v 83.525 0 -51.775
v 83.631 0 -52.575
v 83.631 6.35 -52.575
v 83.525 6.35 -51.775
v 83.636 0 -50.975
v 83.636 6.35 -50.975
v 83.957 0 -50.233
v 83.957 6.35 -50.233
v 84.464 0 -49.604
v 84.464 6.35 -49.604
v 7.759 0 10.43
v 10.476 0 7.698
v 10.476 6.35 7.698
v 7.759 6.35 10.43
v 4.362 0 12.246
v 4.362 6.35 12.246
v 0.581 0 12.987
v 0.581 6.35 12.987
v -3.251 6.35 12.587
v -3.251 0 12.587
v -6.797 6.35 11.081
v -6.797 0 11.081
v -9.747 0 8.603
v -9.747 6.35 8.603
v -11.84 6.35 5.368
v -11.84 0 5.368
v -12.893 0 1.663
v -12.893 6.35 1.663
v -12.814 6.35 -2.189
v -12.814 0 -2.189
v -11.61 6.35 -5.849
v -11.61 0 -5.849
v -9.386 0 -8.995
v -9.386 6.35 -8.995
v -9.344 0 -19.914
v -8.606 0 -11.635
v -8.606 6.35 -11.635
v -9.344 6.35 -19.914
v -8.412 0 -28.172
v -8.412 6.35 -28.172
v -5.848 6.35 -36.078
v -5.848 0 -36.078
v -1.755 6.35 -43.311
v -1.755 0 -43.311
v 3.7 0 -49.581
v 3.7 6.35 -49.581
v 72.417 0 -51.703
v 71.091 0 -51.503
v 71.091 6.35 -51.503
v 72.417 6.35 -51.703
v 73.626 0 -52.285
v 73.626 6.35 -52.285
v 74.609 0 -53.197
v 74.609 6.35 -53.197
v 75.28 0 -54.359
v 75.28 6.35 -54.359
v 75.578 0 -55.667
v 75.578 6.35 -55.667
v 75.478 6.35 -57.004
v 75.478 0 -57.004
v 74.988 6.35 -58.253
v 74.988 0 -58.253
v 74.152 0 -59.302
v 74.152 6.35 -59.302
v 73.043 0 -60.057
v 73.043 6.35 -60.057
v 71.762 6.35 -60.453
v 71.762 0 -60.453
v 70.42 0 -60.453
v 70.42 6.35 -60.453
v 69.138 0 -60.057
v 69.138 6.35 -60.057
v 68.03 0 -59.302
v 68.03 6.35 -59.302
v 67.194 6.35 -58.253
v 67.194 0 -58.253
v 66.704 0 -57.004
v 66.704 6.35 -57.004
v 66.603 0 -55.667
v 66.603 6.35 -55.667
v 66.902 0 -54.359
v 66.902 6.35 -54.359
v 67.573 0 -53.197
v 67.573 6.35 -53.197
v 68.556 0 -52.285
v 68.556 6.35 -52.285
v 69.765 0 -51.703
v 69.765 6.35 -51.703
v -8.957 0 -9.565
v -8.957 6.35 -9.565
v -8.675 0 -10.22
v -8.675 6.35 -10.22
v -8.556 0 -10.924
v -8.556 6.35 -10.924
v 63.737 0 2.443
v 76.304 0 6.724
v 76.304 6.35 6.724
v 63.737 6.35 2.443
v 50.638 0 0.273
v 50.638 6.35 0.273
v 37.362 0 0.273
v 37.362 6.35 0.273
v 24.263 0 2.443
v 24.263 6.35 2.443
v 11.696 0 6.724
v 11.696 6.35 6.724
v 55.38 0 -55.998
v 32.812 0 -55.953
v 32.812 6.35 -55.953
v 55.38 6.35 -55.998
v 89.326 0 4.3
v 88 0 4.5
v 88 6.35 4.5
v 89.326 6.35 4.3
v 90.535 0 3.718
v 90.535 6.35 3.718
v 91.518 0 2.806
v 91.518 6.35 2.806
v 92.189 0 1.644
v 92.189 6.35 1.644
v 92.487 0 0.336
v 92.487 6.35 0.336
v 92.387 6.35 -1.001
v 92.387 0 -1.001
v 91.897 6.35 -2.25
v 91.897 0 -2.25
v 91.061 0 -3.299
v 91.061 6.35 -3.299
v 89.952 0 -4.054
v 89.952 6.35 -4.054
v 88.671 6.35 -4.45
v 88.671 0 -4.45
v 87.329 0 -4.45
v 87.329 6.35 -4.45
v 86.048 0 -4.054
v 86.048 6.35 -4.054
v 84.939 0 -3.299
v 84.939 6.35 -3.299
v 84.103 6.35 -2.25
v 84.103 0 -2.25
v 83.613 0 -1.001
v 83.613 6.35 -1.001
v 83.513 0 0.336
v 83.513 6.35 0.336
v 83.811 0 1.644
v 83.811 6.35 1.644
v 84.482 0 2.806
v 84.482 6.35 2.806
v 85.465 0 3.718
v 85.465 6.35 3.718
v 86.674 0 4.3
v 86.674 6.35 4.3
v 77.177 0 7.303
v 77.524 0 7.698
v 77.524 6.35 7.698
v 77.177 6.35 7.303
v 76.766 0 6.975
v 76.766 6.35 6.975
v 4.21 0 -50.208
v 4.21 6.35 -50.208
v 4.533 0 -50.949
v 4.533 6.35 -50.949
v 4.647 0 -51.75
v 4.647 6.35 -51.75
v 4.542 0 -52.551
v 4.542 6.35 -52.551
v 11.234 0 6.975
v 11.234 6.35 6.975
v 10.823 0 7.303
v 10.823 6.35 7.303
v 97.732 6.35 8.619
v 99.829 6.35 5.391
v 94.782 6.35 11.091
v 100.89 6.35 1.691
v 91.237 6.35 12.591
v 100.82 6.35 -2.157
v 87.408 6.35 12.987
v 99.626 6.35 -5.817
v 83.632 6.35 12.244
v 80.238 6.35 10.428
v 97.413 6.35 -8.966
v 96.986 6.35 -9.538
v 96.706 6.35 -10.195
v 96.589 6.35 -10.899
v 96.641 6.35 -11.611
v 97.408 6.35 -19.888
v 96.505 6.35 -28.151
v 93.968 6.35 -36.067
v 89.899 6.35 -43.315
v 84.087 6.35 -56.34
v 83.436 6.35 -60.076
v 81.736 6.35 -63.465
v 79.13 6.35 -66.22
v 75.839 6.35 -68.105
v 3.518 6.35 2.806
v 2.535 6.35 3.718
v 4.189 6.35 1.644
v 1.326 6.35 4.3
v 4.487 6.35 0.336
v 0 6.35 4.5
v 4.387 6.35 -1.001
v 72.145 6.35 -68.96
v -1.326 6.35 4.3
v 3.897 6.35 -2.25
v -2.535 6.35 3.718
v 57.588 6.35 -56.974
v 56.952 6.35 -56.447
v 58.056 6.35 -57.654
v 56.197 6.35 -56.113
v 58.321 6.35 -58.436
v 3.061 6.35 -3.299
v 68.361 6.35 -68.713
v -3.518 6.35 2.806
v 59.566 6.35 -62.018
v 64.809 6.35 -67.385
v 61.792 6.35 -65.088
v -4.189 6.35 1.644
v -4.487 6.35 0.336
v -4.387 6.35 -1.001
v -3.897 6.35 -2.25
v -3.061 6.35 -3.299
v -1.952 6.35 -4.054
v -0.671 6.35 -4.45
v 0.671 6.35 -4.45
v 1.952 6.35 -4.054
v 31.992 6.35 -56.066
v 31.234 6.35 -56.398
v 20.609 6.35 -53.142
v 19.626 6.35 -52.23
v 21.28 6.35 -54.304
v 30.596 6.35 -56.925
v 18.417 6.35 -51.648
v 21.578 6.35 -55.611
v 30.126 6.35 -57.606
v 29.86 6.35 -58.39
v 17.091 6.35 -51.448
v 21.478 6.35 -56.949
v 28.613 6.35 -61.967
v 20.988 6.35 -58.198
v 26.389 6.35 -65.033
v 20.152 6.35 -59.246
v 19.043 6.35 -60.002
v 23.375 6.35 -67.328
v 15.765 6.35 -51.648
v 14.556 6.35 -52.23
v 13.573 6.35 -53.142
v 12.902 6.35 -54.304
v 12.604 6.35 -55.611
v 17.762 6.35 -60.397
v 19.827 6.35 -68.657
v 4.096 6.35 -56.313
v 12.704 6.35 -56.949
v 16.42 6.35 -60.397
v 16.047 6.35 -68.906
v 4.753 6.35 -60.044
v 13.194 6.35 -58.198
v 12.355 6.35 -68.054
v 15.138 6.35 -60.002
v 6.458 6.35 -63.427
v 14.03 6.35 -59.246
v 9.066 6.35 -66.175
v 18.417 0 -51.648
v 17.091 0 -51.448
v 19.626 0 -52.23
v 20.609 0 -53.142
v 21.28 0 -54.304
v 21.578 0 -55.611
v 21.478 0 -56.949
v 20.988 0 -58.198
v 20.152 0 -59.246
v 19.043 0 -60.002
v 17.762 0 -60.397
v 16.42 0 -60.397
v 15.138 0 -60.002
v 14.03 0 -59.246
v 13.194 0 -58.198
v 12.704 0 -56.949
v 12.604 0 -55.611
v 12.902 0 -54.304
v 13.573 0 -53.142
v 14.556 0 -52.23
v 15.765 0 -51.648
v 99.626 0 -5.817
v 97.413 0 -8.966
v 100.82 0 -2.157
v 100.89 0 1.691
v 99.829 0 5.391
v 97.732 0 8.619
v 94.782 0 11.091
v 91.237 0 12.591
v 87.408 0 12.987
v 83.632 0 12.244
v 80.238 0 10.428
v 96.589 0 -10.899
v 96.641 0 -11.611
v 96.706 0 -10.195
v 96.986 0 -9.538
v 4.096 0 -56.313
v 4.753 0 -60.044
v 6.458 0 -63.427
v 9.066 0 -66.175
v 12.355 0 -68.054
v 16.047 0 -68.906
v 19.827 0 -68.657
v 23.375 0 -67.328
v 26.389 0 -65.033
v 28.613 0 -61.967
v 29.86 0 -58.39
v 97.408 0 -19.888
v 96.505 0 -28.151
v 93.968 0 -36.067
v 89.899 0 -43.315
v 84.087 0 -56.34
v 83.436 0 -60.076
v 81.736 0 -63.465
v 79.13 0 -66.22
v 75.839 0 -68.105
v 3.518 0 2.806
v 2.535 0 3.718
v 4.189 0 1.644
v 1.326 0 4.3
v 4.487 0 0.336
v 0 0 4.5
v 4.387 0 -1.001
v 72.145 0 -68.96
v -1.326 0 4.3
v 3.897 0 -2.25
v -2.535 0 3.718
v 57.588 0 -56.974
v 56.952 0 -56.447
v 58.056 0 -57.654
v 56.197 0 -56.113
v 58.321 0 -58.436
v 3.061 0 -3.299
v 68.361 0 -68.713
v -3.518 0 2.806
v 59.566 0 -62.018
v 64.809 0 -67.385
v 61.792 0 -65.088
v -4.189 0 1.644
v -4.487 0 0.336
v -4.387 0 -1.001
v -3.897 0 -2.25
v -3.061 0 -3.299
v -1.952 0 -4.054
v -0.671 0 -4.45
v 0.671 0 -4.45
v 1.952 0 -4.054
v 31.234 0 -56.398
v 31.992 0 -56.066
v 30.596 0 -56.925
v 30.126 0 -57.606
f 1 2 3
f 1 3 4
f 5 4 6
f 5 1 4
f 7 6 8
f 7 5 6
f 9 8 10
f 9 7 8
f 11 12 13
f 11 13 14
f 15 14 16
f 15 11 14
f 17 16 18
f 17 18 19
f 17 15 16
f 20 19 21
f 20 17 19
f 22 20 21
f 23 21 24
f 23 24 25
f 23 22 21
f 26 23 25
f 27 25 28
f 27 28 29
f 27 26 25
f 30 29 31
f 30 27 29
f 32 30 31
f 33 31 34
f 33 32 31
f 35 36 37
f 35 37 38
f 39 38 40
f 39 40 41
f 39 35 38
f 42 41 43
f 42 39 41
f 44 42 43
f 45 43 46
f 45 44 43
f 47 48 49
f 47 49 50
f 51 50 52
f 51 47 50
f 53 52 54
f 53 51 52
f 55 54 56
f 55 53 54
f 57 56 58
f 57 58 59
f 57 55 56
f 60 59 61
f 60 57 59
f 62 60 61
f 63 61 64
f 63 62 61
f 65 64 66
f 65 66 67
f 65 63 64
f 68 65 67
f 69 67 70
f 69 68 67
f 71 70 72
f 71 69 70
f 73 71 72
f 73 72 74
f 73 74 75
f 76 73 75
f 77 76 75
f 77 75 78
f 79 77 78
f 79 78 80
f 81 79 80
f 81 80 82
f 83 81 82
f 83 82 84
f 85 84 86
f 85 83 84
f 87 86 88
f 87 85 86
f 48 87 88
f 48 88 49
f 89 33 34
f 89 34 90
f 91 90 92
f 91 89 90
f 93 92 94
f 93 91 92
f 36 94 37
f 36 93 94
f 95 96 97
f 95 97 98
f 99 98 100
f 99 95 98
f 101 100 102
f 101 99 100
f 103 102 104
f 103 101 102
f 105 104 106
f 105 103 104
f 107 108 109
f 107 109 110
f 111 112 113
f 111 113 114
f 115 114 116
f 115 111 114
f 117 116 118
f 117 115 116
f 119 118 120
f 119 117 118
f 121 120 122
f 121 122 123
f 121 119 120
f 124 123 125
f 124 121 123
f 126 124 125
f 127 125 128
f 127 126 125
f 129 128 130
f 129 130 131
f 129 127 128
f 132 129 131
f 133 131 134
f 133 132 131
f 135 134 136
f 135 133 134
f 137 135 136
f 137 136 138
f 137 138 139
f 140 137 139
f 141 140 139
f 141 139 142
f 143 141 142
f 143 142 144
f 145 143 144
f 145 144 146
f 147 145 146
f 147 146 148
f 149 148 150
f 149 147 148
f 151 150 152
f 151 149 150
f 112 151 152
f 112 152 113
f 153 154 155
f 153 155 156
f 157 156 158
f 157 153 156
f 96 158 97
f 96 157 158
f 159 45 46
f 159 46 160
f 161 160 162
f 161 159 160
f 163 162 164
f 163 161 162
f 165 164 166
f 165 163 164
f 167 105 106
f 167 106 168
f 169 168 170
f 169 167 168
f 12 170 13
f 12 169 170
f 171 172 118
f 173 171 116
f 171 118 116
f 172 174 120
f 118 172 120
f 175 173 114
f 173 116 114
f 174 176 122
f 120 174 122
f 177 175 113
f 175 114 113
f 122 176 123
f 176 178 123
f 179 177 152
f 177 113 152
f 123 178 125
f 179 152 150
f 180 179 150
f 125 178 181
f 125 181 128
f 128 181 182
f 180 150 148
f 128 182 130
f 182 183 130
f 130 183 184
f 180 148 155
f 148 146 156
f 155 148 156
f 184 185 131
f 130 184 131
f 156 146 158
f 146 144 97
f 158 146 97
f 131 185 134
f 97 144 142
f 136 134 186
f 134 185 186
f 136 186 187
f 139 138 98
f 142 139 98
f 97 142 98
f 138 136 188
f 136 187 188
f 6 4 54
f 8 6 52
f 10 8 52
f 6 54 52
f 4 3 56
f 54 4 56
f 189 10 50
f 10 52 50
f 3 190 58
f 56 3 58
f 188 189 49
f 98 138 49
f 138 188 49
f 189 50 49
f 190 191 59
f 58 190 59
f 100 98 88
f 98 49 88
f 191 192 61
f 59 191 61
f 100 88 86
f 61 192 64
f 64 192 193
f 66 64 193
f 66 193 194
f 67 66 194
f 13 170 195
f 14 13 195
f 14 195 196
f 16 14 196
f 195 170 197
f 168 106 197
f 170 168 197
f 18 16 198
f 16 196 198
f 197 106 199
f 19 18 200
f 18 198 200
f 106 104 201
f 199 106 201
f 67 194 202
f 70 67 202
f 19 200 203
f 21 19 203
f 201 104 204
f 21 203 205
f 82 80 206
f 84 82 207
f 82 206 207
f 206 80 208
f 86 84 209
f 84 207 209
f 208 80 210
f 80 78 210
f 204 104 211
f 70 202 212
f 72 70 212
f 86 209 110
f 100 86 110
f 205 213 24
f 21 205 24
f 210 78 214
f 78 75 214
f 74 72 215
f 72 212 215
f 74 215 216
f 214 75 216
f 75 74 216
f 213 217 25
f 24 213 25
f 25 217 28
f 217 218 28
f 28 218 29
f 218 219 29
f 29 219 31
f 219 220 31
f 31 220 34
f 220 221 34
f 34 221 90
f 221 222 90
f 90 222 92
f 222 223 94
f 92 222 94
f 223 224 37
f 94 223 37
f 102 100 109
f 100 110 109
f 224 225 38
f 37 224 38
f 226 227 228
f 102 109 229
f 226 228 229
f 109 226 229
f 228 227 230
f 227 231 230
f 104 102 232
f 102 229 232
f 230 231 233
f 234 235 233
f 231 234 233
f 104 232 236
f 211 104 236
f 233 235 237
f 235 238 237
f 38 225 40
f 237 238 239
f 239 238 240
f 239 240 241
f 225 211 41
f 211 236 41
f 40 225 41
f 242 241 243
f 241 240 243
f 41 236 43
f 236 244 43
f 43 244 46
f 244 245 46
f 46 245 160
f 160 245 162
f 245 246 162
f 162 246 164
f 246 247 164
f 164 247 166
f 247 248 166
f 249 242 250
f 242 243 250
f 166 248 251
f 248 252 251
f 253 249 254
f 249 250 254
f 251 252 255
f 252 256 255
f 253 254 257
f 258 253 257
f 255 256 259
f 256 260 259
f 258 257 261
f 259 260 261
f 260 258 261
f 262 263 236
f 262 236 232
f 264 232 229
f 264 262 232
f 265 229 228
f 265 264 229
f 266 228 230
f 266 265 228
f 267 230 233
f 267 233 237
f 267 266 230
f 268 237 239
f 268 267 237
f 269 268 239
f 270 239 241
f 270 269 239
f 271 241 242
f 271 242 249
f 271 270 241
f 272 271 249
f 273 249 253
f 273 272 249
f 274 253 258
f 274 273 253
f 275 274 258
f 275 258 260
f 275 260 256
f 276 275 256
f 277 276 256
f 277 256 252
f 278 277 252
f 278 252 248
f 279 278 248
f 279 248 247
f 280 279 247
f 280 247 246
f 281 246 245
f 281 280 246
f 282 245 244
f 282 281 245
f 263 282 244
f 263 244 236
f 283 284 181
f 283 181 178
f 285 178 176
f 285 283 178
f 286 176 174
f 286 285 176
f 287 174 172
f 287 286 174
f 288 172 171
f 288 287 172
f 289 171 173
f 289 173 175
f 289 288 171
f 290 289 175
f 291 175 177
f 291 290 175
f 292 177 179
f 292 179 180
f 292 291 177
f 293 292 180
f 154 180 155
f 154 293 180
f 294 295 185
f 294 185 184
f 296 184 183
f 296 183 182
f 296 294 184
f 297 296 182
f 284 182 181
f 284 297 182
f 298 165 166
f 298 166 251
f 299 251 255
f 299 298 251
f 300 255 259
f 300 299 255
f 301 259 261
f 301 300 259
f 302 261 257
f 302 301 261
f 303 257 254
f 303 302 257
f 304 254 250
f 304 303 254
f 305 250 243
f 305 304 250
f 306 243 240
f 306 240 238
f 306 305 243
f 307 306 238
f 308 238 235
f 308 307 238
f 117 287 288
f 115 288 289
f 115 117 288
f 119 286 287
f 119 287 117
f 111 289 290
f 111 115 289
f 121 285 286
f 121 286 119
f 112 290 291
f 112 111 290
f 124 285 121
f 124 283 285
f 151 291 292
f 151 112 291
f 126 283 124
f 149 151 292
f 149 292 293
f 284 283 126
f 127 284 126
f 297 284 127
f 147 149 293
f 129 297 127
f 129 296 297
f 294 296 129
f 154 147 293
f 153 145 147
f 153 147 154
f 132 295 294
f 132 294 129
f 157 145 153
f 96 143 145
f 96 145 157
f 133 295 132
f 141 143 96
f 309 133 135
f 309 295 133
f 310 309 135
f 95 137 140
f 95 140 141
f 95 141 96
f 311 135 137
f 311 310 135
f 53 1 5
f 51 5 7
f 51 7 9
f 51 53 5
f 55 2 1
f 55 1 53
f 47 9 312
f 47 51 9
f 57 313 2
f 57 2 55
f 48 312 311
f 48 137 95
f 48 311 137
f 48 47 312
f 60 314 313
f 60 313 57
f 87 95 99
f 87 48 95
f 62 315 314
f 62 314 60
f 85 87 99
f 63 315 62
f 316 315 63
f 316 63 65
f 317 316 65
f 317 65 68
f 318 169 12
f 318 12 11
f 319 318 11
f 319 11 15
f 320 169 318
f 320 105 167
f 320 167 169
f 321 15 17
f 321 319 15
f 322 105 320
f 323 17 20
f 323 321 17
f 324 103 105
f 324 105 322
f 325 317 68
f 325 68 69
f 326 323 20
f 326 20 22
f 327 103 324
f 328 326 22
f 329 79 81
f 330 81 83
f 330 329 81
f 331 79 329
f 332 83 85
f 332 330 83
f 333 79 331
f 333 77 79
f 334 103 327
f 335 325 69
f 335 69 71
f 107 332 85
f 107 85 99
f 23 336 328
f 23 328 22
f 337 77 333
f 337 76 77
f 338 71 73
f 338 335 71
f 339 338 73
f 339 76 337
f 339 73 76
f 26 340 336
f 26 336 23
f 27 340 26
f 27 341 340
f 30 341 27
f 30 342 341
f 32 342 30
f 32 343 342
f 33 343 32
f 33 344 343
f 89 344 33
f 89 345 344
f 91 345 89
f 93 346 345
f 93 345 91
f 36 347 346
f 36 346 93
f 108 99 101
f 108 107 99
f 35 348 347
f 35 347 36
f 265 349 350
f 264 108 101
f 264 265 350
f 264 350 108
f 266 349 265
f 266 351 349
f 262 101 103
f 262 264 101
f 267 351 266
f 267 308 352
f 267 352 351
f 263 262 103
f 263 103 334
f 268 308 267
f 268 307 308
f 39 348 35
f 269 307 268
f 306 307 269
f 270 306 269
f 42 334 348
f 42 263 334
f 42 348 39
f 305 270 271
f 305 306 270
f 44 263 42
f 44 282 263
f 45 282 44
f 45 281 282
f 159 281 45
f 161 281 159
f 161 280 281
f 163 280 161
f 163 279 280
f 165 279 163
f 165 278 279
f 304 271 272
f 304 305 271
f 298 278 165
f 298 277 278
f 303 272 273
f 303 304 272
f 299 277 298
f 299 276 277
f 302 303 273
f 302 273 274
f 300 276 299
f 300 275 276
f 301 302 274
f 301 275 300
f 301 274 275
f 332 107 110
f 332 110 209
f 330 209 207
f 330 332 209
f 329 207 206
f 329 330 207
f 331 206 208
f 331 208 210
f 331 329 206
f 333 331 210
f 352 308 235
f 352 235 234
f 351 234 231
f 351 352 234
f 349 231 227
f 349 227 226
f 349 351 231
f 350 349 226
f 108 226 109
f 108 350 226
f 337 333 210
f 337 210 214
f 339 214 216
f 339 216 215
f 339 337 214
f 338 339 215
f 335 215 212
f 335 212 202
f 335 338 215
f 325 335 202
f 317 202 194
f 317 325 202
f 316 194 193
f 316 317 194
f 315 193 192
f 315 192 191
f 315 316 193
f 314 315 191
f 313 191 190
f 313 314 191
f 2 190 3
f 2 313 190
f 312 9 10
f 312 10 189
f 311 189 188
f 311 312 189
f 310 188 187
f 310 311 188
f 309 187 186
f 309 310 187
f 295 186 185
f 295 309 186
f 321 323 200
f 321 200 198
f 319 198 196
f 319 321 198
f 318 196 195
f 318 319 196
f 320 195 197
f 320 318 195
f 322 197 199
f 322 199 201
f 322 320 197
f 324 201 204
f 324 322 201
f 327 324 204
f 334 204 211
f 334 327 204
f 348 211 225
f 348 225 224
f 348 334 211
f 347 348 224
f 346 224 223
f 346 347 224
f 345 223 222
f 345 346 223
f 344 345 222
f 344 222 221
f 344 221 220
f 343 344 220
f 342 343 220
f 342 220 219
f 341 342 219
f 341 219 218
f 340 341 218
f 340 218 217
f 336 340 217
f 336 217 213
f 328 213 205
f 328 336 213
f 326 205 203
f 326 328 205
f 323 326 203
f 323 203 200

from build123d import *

# Parameters (mm, degrees)
SKETCH1_R      = 4.5
EXTRUDE1_DEPTH = 6.35


with BuildPart() as part:
    # Sketch1 → Extrude1 (new body)
    with BuildSketch(Plane(origin=(0, 0, 0), x_dir=(1, 0, 0), z_dir=(0, 1, 0))):
        with BuildLine():
            Line((32.812063874, 55.953109441), (55.379571692, 55.997622064))
            ThreePointArc((55.379571692, 55.997622064), (57.288458974, 56.688173959), (58.320639688, 58.436120054))
            ThreePointArc((58.320639688, 58.436120054), (74.0236038, 68.667854555), (83.630875665, 52.575253766))
            ThreePointArc((83.630875665, 52.575253766), (83.636046743, 50.974550497), (84.463614261, 49.604364488))
            ThreePointArc((84.463614261, 49.604364488), (95.435770873, 32.172746021), (96.641280568, 11.610735189))
            ThreePointArc((96.641280568, 11.610735189), (96.705732474, 10.194548777), (97.413259954, 8.966077015))
            ThreePointArc((97.413259954, 8.966077015), (96.34909056, -9.964571582), (77.524483139, -7.698282048))
            ThreePointArc((77.524483139, -7.698282048), (76.978786155, -7.130320059), (76.304071652, -6.723962634))
            ThreePointArc((76.304071652, -6.723962634), (44, 0), (11.695928348, -6.723962634))
            ThreePointArc((11.695928348, -6.723962634), (11.021213845, -7.130320059), (10.475516861, -7.698282048))
            ThreePointArc((10.475516861, -7.698282048), (-8.364205722, -9.951887391), (-9.385998192, 8.994611606))
            ThreePointArc((-9.385998192, 8.994611606), (-8.674953739, 10.220222023), (-8.60571551, 11.635464468))
            ThreePointArc((-8.60571551, 11.635464468), (-7.328831083, 32.189532865), (3.700447598, 49.58077127))
            ThreePointArc((3.700447598, 49.58077127), (4.532944762, 50.949409073), (4.542457699, 52.551323698))
            ThreePointArc((4.542457699, 52.551323698), (14.169725803, 68.615280401), (29.859544881, 58.389598348))
            ThreePointArc((29.859544881, 58.389598348), (30.896689666, 56.63923798), (32.812063874, 55.953109441))
        make_face()
        with Locations(Location((17.090937333, 55.947742234, 0), (0, 0, 270))):  # turned: the seam where the file's is
            Circle(SKETCH1_R, mode=Mode.SUBTRACT)
        with Locations(Location((71.090909091, 56.002969963, 0), (0, 0, 270))):  # turned: the seam where the file's is
            Circle(SKETCH1_R, mode=Mode.SUBTRACT)
        with Locations(Location((0, 0, 0), (0, 0, 270))):  # turned: the seam where the file's is
            Circle(SKETCH1_R, mode=Mode.SUBTRACT)
        with Locations(Location((88, 0, 0), (0, 0, 270))):  # turned: the seam where the file's is
            Circle(SKETCH1_R, mode=Mode.SUBTRACT)
    extrude(amount=EXTRUDE1_DEPTH)


solid = part.part
